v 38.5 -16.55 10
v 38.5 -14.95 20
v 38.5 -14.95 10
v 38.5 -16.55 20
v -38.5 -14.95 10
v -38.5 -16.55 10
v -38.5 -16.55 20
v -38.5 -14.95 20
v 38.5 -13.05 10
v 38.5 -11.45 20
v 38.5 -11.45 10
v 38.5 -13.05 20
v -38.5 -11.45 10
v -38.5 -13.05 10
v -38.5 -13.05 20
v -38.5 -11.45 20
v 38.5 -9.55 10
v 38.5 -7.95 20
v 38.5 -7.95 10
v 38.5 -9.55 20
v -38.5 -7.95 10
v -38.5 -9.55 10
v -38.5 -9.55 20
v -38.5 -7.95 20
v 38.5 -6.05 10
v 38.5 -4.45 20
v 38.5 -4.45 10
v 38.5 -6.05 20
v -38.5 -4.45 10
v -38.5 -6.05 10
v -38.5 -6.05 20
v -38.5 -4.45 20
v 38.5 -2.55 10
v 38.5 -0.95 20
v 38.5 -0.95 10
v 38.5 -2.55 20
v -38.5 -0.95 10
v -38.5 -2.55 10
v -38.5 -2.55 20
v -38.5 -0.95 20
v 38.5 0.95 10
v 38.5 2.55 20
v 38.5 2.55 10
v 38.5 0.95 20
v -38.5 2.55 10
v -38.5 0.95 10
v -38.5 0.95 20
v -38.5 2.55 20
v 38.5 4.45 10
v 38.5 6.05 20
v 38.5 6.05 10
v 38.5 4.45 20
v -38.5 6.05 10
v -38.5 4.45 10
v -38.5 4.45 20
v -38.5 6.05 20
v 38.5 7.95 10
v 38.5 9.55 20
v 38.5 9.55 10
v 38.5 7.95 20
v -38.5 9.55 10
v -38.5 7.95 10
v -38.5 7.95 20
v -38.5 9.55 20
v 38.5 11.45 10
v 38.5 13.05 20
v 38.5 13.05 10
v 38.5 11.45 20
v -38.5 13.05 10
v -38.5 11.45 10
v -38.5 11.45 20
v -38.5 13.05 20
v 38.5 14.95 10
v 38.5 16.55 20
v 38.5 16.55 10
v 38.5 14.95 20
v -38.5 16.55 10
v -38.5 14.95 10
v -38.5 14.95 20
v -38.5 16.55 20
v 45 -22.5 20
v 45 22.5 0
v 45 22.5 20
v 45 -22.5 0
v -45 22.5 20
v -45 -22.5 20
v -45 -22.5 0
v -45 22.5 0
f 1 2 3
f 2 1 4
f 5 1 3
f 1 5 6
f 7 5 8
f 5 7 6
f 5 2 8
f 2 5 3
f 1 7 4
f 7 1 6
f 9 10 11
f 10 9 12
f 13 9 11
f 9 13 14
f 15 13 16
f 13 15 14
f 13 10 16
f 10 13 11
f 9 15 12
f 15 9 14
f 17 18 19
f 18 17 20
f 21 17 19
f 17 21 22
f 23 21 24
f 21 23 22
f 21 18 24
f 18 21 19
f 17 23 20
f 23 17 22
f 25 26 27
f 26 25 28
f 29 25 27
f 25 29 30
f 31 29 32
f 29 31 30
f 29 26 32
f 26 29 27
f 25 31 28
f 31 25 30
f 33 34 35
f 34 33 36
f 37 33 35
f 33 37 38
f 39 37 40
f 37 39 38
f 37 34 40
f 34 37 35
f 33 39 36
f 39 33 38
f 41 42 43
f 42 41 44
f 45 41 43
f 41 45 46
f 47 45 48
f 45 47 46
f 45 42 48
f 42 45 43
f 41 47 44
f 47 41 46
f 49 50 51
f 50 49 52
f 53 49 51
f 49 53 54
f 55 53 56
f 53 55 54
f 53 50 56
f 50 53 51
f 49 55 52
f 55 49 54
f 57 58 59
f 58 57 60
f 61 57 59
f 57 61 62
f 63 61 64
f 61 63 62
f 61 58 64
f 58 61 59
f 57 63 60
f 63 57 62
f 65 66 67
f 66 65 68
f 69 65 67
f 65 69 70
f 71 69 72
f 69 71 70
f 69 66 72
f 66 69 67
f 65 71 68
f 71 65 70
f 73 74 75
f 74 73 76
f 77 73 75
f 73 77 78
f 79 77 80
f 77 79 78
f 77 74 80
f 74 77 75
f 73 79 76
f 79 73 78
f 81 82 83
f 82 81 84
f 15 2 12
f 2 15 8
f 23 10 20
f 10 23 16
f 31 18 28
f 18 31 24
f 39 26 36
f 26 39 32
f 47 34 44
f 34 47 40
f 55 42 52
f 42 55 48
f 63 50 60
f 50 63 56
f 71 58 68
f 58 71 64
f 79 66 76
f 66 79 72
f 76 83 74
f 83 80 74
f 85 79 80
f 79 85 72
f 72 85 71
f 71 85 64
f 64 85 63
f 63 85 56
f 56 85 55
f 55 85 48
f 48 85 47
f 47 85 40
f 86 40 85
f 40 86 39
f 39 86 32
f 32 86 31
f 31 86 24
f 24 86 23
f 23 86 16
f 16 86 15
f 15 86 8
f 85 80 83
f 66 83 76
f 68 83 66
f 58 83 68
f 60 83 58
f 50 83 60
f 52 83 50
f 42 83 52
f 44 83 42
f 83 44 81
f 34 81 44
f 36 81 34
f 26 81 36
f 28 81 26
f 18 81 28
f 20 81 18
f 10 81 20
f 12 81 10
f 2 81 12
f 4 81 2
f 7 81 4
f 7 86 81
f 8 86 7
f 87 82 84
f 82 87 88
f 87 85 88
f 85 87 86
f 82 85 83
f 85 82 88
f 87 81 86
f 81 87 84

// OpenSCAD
// Microscope slide drying rack
// 10 slides standing on their long edge, side by side

// ---- Block ----
block_l = 90;    // X length of base block
block_w = 45;    // Y width of base block
block_h = 20;    // Z height of base block

// ---- Slots ----
slot_count = 10;     // number of slide slots
slot_len   = 77;     // slot length along X
slot_w     = 1.6;    // slot width along Y
slot_depth = 10;     // slot depth from top face
pitch      = 3.5;    // centre-to-centre spacing along Y

// ---- Misc ----
eps = 0.5;          // overcut past faces
$fn = 64;

difference() {
    // Base block
    translate([-block_l/2, -block_w/2, 0])
        cube([block_l, block_w, block_h]);

    // Slots, centred in X and Y
    for (i = [0 : slot_count - 1]) {
        y = (i - (slot_count - 1)/2) * pitch;
        translate([-slot_len/2, y - slot_w/2, block_h - slot_depth])
            cube([slot_len, slot_w, slot_depth + eps]);
    }
}
